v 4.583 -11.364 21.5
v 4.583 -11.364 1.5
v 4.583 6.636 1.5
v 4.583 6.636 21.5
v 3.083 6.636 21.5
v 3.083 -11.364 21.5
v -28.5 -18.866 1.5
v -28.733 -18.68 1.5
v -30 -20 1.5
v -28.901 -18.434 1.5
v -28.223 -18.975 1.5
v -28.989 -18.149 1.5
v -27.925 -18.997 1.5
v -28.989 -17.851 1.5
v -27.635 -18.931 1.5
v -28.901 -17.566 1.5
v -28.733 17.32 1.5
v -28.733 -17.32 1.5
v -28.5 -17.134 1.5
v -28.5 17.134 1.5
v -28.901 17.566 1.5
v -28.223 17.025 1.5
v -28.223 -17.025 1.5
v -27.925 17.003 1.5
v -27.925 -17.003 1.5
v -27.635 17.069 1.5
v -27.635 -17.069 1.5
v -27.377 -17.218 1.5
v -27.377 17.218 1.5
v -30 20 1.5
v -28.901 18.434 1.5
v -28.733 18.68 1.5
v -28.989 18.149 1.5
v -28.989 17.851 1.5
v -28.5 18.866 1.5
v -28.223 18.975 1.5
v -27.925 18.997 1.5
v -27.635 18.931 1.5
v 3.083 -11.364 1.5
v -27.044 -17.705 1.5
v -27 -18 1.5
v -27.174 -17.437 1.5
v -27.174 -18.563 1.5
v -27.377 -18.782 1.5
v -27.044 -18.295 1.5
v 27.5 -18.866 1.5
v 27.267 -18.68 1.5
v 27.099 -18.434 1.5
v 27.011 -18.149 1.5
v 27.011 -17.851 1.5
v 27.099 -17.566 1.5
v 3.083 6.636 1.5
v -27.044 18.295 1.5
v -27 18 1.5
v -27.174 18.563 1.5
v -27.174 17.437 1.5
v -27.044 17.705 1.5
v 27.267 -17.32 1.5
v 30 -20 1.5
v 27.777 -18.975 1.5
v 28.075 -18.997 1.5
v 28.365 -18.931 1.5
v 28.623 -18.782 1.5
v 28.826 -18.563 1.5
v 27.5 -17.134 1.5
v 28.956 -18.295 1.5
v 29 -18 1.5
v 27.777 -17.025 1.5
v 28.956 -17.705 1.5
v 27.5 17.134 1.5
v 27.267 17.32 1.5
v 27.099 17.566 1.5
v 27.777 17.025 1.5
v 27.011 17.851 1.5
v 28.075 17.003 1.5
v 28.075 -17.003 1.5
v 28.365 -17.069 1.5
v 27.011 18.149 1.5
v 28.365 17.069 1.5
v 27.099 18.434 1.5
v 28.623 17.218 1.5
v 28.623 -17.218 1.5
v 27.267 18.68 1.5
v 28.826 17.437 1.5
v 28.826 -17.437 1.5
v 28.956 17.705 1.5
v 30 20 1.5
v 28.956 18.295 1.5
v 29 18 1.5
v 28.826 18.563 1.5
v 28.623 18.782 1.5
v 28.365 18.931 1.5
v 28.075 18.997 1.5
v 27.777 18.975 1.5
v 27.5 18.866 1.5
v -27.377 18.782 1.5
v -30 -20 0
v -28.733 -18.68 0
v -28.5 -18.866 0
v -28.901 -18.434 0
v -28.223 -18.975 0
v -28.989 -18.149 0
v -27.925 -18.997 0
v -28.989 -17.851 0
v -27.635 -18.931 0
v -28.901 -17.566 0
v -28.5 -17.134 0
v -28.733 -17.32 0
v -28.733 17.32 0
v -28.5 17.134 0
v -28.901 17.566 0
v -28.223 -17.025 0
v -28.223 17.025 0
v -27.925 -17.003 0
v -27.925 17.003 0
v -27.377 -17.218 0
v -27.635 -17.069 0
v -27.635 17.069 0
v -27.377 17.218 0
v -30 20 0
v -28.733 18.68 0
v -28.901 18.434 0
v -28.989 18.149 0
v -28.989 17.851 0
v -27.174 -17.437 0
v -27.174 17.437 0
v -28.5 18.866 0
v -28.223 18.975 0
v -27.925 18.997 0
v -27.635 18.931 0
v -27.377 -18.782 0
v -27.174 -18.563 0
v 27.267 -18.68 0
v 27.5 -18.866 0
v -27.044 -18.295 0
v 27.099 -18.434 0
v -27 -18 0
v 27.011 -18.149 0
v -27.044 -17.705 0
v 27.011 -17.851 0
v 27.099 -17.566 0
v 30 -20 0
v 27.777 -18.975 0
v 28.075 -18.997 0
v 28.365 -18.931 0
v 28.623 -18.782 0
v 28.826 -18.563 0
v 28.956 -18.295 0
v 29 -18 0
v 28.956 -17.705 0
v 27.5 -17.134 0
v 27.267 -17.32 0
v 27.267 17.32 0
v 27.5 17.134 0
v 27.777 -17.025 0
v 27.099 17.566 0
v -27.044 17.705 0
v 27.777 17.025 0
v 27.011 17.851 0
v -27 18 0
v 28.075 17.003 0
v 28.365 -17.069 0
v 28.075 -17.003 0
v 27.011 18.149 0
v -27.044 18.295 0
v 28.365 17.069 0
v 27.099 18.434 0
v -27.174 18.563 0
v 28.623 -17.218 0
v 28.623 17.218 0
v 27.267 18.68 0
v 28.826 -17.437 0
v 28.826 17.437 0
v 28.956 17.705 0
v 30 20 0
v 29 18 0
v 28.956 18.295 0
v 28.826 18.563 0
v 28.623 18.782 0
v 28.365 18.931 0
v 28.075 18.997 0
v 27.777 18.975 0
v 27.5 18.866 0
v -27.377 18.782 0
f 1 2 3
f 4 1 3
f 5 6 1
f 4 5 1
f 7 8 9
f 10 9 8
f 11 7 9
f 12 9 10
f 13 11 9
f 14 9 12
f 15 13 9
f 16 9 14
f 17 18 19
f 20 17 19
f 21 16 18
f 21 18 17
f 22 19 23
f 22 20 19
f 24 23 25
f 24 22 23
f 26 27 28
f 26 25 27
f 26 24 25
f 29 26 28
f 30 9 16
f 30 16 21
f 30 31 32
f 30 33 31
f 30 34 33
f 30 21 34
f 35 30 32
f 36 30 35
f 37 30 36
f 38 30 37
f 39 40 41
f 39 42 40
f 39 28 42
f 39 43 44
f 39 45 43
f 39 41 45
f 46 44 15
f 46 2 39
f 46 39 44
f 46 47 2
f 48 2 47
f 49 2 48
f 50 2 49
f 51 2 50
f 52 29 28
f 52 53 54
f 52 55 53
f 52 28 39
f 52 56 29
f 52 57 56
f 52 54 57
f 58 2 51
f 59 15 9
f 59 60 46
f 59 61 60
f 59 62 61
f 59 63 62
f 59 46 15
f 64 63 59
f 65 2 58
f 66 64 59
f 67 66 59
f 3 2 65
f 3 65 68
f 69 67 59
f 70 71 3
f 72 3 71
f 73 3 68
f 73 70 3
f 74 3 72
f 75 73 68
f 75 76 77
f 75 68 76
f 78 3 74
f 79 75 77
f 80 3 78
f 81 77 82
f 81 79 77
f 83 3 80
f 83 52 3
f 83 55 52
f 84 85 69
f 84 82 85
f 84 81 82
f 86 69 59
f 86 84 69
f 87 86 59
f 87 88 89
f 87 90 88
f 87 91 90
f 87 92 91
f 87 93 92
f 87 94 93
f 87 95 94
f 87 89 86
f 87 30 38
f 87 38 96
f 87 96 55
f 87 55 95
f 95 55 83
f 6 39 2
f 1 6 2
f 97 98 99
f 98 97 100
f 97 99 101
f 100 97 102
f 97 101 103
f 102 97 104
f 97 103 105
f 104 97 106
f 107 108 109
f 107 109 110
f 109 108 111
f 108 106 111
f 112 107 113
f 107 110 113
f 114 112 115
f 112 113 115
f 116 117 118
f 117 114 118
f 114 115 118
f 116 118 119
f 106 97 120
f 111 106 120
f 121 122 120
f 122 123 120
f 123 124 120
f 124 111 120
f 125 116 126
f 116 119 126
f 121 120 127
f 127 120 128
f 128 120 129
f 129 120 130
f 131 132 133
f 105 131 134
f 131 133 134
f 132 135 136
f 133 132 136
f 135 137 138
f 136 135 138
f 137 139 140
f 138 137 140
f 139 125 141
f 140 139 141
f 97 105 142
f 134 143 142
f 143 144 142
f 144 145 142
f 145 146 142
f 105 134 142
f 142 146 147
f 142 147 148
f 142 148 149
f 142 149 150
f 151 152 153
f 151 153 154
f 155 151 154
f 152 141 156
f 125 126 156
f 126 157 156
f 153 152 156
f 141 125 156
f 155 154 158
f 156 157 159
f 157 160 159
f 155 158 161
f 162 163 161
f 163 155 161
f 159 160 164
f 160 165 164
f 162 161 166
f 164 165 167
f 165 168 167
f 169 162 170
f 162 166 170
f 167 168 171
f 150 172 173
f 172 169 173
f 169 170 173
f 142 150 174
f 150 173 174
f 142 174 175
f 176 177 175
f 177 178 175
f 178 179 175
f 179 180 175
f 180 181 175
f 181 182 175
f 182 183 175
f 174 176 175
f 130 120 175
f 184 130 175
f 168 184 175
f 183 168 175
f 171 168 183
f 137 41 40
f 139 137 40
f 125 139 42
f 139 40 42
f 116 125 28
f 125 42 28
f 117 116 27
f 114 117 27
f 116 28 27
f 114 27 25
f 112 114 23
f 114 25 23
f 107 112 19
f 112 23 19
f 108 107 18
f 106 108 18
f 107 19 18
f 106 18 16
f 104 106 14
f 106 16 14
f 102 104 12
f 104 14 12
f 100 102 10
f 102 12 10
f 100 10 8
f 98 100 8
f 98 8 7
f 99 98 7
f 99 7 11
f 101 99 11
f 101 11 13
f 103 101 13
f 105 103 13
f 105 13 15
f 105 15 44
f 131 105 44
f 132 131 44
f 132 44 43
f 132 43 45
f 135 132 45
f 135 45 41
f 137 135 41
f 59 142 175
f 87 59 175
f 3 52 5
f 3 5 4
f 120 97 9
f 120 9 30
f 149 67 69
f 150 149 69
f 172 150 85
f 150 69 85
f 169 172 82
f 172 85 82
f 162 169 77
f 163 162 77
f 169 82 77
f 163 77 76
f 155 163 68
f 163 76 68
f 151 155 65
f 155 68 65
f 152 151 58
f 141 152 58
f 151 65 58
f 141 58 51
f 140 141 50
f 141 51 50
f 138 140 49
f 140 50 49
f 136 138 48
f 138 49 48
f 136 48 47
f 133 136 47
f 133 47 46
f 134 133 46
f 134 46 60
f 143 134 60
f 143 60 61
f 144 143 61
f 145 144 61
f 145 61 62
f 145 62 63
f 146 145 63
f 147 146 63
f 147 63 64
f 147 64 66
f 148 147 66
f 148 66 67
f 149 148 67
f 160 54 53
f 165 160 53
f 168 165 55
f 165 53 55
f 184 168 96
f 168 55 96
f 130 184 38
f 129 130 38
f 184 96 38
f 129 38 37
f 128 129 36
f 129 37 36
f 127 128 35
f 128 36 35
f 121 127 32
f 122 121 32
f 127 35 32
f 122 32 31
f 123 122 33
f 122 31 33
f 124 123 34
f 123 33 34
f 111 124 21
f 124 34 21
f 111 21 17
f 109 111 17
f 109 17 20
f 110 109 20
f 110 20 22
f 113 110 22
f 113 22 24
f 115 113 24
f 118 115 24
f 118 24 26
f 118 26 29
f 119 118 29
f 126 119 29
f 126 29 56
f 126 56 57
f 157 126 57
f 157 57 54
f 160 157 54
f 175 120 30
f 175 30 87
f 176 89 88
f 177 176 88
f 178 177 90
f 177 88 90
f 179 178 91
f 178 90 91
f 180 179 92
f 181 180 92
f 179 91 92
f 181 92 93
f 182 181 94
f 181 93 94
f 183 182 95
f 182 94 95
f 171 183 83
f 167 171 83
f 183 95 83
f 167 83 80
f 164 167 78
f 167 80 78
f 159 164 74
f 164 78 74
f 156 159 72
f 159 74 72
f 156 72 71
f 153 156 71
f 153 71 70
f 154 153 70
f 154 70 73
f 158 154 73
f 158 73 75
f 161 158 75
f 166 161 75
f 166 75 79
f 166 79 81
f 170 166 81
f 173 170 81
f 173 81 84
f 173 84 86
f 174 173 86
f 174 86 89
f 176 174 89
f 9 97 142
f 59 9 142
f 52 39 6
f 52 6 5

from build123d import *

# Parameters (mm, degrees)
ESBO_O1_W                = 60
ESBO_O1_H                = 40
RESSALTO_EXTRUS_O1_DEPTH = 1.5
ESBO_O2_R                = 1
CORTE_EXTRUS_O1_DEPTH    = 2.5
ESBO_O3_W                = 1.5
ESBO_O3_H                = 18
RESSALTO_EXTRUS_O2_DEPTH = 20


with BuildPart() as part:
    # Esboço1 → Ressalto-extrusão1 (new body)
    with BuildSketch(Plane.XY):
        Rectangle(ESBO_O1_W, ESBO_O1_H)
    extrude(amount=RESSALTO_EXTRUS_O1_DEPTH)

    # Esboço2 → Corte-extrusão1 (cut, through all)
    with BuildSketch(Plane.XY.offset(1.5)):
        with Locations((-28, 18)):
            Circle(ESBO_O2_R)
        with Locations((28, 18)):
            Circle(ESBO_O2_R)
        with Locations((28, -18)):
            Circle(ESBO_O2_R)
        with Locations((-28, -18)):
            Circle(ESBO_O2_R)
    extrude(amount=-CORTE_EXTRUS_O1_DEPTH, mode=Mode.SUBTRACT)

    # Esboço3 → Ressalto-extrusão2 (add)
    with BuildSketch(Plane.XY.offset(1.5)):
        with Locations((3.833169049, -2.364388559)):
            Rectangle(ESBO_O3_W, ESBO_O3_H)
    extrude(amount=RESSALTO_EXTRUS_O2_DEPTH)


solid = part.part
